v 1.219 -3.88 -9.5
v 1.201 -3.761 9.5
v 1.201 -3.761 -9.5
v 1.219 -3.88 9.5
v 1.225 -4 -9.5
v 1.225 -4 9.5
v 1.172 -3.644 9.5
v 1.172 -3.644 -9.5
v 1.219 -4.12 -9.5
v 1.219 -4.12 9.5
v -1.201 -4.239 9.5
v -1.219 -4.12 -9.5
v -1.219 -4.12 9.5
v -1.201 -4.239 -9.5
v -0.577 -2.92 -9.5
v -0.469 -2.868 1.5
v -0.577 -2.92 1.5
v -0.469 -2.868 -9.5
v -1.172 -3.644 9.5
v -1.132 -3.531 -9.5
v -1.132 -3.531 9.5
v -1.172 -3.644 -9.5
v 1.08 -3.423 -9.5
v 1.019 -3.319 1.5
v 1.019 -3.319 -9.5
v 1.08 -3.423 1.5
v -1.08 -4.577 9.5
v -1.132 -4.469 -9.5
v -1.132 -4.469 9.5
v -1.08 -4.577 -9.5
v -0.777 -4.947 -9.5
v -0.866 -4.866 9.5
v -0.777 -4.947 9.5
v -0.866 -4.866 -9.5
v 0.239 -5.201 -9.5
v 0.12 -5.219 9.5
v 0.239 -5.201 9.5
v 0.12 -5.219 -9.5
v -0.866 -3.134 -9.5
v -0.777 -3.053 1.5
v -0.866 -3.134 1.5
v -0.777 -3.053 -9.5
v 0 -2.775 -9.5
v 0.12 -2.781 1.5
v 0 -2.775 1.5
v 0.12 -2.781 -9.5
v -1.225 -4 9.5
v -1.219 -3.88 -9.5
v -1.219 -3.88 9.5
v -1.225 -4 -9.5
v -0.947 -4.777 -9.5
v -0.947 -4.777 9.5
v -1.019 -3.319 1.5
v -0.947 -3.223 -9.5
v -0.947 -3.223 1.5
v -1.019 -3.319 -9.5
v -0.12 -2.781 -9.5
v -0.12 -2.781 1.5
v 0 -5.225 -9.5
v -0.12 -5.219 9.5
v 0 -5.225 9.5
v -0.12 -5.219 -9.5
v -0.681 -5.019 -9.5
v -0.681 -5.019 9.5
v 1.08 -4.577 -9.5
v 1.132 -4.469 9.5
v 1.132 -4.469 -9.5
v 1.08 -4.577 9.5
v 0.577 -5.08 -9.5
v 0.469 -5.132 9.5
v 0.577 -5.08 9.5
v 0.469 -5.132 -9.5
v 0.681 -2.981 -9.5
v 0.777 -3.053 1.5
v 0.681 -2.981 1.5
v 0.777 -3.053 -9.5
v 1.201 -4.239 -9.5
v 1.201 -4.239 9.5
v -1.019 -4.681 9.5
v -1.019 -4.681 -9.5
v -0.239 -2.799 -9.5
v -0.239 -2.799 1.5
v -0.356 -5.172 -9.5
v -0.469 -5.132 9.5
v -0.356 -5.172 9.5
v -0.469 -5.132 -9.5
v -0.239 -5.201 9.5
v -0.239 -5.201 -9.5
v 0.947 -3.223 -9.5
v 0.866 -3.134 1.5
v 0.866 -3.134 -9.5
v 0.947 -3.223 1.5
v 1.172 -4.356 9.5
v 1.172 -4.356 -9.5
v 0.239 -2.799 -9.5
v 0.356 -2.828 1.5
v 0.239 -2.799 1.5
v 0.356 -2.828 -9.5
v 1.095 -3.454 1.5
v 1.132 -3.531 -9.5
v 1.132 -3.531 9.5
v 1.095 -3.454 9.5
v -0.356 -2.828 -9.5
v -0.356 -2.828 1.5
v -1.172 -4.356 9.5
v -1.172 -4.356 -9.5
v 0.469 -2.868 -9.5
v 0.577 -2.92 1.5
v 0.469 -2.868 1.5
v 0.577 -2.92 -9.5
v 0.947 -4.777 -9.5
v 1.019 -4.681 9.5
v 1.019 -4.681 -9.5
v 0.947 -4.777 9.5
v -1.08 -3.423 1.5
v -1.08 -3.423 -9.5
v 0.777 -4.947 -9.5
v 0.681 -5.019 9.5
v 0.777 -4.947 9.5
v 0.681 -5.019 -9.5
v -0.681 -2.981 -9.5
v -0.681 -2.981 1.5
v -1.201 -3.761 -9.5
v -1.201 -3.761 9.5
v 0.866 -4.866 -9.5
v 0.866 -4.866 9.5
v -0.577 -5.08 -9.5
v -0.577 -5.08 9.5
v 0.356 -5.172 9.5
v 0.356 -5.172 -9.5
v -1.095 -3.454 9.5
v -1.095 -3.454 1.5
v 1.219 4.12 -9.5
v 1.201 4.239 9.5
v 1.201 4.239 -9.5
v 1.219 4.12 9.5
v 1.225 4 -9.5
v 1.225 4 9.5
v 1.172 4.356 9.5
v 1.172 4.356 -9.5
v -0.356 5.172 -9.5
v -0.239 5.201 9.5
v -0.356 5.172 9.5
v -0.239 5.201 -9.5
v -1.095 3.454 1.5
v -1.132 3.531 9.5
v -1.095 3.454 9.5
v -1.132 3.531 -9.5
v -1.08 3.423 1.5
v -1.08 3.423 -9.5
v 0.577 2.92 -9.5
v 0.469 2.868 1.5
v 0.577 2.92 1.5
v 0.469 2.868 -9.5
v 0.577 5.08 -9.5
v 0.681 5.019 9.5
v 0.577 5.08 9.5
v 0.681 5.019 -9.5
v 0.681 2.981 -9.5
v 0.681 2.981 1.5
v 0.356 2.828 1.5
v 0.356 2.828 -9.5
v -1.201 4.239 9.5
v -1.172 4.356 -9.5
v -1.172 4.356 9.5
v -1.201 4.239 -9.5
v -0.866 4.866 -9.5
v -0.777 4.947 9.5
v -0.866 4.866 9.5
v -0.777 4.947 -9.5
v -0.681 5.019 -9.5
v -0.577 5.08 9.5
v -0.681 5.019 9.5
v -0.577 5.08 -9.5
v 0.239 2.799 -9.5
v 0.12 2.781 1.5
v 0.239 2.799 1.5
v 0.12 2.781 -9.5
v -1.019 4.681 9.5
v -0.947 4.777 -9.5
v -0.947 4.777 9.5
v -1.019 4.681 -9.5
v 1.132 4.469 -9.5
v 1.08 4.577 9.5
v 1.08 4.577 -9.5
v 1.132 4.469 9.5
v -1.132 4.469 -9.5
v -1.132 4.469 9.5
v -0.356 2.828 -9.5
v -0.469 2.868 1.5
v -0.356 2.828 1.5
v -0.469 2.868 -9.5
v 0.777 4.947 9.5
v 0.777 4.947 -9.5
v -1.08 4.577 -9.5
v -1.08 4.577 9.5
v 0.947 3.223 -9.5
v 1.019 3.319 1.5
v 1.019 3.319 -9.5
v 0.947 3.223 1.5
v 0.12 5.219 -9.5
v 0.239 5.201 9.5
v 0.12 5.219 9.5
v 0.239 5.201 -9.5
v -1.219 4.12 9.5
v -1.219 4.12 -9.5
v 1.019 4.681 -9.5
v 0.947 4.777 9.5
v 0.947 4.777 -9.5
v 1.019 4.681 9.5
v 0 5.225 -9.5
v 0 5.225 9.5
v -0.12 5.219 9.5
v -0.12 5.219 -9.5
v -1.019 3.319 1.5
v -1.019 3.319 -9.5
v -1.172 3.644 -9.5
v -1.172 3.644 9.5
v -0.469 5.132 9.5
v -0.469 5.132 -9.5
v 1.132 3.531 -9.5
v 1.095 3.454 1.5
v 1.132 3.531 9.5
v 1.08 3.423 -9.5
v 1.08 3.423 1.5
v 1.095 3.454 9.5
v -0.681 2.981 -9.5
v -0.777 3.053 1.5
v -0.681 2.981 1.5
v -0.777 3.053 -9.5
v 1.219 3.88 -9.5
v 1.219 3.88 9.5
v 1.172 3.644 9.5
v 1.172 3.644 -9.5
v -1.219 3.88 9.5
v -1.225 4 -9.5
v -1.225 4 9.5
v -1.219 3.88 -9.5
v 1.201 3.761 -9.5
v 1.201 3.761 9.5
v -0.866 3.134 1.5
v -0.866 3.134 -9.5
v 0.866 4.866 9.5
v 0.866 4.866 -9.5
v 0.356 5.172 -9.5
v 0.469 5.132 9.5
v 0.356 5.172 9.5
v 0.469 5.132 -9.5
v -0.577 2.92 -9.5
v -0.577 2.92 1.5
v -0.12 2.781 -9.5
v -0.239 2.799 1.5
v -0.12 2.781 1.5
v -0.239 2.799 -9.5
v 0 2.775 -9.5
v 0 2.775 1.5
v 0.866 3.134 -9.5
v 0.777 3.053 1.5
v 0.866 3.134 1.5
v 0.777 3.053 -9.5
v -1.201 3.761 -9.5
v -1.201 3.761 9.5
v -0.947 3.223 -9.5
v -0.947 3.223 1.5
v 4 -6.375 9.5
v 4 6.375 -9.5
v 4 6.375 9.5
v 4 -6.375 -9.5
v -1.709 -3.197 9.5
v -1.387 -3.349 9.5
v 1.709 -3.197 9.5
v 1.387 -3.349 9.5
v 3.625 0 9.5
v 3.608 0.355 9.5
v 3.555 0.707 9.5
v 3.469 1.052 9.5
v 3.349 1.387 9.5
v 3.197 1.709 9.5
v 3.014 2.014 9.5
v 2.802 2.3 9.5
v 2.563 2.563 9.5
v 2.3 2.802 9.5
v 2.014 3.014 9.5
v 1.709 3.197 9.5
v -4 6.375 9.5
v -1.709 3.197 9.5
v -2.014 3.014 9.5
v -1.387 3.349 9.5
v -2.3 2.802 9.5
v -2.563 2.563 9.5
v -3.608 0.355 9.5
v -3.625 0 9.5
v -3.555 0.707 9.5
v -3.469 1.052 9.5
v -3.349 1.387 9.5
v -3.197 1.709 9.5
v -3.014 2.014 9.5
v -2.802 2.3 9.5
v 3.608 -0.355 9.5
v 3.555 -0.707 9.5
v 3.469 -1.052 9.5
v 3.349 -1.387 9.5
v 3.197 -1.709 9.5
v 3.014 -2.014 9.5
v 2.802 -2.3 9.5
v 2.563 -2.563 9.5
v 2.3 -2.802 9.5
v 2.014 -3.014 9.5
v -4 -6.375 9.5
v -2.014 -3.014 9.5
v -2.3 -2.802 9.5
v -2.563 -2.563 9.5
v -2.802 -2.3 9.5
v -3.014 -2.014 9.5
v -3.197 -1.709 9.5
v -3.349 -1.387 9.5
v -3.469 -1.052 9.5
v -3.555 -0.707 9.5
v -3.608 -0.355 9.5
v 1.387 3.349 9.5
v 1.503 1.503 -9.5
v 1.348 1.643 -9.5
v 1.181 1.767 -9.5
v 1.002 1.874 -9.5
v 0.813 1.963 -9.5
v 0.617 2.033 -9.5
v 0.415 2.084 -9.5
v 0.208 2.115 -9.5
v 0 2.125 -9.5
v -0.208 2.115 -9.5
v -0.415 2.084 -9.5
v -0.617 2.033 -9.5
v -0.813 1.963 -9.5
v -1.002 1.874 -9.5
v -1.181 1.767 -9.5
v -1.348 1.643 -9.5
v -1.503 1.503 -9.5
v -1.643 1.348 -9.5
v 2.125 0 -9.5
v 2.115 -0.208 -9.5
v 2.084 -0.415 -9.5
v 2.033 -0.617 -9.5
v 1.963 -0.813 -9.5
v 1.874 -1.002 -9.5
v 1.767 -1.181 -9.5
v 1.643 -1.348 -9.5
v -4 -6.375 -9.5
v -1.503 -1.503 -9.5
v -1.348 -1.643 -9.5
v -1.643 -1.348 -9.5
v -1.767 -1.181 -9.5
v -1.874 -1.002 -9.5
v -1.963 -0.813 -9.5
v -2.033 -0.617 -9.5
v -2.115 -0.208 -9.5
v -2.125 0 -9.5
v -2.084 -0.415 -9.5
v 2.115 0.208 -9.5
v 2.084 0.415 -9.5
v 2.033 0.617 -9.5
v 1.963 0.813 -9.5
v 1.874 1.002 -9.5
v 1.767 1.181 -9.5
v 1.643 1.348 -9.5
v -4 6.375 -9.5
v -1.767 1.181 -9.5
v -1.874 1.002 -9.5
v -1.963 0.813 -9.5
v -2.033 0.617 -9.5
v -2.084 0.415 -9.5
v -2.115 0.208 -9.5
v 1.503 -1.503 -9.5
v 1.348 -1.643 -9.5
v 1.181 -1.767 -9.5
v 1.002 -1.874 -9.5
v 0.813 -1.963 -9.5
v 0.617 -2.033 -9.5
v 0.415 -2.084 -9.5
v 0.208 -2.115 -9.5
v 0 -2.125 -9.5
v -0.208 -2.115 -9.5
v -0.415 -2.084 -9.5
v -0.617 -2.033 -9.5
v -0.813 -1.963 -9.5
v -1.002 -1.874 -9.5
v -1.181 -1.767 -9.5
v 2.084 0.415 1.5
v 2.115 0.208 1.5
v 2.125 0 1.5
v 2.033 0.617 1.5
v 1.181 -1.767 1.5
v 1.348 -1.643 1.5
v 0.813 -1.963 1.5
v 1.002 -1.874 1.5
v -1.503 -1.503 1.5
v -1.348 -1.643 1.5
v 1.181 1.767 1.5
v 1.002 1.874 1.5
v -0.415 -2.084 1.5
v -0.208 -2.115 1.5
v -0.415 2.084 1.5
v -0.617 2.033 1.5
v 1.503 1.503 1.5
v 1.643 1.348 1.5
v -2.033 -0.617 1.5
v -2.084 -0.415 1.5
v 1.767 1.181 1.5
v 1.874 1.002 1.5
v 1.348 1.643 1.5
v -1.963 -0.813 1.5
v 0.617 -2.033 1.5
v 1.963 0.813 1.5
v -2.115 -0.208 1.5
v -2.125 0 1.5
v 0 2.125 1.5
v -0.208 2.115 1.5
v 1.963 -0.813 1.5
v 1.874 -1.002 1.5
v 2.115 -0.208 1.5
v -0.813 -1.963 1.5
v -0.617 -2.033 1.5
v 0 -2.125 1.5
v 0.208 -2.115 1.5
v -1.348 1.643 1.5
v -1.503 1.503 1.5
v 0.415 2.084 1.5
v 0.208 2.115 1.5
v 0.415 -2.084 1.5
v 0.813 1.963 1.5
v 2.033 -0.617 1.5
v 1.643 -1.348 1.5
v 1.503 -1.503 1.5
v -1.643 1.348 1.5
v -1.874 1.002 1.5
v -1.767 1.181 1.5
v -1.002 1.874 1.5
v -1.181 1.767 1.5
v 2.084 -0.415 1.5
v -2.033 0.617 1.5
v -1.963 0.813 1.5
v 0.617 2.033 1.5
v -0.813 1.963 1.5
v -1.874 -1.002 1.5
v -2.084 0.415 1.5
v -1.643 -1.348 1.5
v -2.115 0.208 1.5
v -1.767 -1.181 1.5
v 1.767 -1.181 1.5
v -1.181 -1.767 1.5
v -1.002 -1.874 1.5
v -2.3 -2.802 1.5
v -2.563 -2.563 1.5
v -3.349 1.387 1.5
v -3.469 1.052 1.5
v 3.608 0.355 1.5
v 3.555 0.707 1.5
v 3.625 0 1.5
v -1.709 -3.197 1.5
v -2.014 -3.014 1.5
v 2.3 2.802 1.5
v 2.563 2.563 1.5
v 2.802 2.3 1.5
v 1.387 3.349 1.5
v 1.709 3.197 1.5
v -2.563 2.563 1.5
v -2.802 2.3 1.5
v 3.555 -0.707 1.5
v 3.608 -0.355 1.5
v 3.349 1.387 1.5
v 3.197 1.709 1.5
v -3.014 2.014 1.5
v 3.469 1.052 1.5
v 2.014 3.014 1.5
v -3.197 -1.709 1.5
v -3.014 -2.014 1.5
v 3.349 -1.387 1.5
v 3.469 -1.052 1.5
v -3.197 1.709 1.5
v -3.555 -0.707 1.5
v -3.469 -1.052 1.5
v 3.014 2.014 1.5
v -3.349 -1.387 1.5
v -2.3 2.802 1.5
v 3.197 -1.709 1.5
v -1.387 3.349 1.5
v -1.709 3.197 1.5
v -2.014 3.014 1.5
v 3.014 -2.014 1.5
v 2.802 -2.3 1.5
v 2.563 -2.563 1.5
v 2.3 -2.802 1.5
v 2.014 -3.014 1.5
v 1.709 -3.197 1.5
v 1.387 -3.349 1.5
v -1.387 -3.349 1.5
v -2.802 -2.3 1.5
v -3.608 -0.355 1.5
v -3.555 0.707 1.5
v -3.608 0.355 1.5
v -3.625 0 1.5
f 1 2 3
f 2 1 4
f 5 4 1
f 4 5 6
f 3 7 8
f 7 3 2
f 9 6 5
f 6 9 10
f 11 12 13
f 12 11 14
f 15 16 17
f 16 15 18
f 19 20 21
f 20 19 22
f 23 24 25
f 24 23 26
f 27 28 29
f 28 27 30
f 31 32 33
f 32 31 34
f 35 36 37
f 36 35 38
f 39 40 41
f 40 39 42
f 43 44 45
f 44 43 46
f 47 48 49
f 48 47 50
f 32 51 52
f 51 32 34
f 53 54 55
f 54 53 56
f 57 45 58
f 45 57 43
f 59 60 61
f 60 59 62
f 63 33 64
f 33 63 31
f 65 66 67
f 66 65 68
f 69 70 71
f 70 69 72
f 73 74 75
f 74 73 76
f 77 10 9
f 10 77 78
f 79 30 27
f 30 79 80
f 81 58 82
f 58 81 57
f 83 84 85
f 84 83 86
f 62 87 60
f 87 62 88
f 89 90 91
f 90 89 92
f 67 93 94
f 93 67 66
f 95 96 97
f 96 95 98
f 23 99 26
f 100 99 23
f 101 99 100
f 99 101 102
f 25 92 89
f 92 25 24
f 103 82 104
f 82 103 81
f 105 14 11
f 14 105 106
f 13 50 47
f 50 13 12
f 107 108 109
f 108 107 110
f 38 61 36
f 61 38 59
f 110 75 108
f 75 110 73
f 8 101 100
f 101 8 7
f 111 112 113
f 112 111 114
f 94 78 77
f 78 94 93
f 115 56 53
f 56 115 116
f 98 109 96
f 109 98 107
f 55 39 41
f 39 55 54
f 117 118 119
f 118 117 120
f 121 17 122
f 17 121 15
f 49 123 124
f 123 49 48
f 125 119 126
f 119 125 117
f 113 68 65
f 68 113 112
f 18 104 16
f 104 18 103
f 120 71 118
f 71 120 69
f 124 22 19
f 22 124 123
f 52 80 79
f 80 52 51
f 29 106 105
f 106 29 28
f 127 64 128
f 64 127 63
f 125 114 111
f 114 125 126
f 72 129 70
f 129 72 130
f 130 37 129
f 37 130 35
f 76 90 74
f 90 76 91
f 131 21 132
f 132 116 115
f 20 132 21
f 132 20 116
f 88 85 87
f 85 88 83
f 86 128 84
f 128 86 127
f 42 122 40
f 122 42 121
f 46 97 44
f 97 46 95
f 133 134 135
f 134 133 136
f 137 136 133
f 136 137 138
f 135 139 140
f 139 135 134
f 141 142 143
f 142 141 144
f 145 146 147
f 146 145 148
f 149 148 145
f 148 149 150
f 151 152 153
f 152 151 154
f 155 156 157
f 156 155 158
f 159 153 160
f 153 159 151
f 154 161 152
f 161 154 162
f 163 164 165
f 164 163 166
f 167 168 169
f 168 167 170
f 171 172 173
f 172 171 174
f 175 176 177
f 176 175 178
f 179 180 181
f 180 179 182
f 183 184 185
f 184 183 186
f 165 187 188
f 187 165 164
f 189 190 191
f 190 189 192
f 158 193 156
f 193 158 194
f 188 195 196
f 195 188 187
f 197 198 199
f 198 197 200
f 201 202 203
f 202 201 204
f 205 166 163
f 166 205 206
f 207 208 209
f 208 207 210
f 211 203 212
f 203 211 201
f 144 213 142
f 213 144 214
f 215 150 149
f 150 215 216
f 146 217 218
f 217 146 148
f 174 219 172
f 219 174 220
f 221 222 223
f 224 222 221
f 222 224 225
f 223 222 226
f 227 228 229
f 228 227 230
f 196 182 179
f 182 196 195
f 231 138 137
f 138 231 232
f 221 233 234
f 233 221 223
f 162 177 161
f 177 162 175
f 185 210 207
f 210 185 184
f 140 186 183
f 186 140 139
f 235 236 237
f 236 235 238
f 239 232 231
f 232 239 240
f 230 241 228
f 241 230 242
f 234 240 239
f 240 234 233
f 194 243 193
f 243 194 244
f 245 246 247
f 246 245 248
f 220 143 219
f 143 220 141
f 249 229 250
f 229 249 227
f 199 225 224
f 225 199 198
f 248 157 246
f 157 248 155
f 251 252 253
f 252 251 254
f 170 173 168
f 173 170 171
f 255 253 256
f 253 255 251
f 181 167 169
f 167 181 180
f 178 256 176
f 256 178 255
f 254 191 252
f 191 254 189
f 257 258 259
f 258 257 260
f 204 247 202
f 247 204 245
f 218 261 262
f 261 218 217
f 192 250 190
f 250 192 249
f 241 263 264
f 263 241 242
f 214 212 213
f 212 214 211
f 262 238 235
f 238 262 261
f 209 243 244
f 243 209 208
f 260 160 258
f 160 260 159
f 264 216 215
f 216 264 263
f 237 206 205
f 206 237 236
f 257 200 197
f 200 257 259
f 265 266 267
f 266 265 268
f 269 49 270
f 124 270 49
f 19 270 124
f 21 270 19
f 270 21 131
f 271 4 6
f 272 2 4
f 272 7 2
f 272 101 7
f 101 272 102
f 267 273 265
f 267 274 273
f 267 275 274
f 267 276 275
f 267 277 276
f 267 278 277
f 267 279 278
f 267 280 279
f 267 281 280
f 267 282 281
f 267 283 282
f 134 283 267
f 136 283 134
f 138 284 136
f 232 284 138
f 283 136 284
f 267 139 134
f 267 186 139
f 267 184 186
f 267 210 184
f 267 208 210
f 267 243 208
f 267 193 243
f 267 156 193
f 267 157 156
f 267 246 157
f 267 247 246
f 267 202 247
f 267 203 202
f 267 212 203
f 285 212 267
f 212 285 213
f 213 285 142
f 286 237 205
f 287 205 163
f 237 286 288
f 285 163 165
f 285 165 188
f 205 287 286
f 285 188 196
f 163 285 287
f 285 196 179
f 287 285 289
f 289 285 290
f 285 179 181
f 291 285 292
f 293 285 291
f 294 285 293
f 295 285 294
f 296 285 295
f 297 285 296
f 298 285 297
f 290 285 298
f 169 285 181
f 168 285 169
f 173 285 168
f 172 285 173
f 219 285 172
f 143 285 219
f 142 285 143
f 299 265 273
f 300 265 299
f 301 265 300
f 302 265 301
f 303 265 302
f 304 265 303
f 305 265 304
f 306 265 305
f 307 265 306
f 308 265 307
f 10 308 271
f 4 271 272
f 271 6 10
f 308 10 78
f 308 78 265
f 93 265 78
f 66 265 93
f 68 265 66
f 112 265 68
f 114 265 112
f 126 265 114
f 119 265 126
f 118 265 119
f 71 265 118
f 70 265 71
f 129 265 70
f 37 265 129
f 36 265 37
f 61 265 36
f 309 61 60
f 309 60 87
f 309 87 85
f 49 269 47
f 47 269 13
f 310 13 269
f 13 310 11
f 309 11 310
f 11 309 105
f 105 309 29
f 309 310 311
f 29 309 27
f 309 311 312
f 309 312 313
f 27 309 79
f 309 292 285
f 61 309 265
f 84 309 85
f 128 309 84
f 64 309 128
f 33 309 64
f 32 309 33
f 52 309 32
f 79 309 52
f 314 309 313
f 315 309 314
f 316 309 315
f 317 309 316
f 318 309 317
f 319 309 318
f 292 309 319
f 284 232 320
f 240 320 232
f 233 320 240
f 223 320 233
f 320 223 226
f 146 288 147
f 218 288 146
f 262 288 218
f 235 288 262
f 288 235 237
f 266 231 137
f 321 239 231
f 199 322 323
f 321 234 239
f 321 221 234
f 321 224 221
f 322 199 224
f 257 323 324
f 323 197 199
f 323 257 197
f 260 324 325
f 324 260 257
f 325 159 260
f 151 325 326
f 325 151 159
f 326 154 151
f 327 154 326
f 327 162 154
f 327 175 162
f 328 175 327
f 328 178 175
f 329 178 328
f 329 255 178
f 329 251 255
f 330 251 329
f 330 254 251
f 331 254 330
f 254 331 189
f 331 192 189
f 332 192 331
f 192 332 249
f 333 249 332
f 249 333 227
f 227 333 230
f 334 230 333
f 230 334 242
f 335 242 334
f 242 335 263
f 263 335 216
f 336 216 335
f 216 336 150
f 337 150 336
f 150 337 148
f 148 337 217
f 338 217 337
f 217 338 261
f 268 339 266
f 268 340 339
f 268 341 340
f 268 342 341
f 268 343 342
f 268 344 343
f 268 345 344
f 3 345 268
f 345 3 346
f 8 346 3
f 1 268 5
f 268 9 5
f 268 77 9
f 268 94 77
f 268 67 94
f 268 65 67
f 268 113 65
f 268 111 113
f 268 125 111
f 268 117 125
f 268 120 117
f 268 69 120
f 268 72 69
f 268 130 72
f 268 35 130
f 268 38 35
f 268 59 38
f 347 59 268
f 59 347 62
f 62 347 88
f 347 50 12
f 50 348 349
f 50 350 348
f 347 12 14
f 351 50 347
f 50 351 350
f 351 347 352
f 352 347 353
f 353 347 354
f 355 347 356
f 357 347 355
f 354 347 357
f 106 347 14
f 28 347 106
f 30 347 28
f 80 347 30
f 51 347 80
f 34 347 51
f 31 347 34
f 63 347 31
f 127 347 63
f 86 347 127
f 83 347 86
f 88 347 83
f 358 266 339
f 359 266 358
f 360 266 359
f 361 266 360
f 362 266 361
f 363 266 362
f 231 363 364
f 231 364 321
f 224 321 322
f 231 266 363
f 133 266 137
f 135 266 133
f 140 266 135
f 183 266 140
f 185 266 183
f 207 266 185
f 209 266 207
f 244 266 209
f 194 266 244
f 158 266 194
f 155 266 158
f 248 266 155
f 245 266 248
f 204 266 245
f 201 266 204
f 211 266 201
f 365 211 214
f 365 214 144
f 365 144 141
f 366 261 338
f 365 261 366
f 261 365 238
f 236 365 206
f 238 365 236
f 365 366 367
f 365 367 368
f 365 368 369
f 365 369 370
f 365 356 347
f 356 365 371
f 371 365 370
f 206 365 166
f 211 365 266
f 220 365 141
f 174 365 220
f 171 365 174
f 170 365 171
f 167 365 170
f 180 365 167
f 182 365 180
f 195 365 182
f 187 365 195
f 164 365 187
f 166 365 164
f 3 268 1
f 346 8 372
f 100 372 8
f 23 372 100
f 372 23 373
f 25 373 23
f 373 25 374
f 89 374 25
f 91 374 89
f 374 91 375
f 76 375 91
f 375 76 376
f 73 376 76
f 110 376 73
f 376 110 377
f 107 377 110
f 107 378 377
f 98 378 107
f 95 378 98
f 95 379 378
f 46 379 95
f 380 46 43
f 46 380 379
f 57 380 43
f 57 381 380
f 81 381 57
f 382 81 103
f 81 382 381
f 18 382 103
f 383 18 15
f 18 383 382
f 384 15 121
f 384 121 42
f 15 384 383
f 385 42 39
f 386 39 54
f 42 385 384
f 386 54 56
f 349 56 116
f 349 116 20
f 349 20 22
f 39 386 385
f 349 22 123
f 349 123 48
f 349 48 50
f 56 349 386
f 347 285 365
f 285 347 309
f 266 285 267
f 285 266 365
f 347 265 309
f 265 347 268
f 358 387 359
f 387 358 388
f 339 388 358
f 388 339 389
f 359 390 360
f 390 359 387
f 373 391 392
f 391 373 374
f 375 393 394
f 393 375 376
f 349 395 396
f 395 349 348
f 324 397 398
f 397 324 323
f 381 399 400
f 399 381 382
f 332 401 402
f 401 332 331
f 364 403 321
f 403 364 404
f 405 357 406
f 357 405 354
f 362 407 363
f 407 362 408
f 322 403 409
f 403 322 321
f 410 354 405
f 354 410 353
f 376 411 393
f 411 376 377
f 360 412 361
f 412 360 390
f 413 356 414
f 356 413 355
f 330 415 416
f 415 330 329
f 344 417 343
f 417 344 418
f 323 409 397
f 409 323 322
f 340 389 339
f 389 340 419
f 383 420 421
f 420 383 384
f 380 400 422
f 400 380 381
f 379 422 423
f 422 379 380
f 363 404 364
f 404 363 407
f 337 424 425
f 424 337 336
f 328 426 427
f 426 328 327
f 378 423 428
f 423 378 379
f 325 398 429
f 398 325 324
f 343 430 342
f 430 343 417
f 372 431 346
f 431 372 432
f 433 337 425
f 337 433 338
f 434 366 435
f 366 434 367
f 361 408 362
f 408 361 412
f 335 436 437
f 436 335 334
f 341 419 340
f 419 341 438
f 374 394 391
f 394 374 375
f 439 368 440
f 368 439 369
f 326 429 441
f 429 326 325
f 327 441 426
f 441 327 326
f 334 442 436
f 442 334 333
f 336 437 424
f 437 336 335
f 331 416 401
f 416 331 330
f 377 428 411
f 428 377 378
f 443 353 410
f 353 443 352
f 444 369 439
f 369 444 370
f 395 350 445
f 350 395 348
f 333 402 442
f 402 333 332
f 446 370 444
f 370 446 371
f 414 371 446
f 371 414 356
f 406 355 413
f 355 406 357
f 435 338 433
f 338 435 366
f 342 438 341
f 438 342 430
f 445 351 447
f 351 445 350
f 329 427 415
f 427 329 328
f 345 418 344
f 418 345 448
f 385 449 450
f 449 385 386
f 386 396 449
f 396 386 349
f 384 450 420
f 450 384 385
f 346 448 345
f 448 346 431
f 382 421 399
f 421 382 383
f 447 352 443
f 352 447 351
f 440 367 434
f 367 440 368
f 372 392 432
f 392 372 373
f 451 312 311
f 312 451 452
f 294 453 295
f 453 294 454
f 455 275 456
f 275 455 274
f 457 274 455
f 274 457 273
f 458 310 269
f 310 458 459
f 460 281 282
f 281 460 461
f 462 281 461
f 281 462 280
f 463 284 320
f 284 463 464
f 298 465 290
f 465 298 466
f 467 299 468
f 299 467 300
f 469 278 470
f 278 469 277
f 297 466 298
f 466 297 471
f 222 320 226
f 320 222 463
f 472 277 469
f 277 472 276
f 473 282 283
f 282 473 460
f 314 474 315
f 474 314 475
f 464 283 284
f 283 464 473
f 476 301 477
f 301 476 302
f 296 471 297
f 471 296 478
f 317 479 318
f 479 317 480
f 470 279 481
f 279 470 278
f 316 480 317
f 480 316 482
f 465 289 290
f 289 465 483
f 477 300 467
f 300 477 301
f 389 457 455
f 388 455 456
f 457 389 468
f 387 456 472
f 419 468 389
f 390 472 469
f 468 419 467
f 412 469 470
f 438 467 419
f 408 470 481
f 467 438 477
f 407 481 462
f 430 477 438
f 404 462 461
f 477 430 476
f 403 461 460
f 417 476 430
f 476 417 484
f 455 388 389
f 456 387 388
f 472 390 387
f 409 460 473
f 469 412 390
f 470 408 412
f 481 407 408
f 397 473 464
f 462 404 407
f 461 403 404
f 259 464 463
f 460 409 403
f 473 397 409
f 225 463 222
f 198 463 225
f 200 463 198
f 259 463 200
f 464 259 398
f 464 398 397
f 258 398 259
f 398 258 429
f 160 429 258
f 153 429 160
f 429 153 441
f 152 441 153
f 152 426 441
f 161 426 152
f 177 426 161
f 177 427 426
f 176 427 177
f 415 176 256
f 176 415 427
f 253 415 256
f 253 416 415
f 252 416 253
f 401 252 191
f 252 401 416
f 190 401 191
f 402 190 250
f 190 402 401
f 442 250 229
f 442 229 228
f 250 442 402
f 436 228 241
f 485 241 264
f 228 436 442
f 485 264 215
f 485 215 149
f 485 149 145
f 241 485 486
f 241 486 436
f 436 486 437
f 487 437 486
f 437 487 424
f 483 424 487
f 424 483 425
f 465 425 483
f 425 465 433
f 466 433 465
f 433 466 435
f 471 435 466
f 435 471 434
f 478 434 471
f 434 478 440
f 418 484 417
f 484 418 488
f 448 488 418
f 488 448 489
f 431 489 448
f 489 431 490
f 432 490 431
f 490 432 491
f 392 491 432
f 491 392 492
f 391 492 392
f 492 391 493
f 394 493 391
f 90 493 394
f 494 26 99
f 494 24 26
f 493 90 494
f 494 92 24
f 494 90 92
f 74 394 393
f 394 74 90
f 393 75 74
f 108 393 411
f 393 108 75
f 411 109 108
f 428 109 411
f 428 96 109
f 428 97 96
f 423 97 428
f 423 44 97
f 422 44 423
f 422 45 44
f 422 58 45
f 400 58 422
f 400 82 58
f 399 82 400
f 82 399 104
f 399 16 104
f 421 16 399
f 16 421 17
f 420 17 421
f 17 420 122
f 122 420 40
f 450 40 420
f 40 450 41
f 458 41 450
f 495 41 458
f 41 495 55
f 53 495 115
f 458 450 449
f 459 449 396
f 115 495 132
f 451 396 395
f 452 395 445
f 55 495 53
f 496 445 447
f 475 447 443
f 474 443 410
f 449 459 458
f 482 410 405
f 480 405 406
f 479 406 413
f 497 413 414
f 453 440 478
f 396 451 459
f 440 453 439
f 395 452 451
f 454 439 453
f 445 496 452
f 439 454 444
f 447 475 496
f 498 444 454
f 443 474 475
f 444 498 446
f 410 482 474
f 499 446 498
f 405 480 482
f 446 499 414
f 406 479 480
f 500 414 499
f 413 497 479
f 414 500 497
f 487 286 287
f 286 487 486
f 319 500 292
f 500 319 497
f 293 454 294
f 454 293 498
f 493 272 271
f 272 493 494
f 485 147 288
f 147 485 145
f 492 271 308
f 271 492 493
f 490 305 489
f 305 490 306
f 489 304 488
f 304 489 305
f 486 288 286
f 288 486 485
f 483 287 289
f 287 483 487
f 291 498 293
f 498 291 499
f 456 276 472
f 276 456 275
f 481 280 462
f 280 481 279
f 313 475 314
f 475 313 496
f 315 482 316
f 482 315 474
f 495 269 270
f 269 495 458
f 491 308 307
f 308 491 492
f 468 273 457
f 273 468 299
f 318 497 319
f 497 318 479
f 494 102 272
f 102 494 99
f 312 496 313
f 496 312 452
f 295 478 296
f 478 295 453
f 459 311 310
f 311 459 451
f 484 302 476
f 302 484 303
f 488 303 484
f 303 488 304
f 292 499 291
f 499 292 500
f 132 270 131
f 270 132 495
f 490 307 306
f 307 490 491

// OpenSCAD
$fn = 64;

// Leadscrew nut housing block (X width, Y length, Z height)
block_W = 8.0;     // X
block_L = 12.75;   // Y
block_H = 19.0;    // Z

// Simple, recognizable "leadscrew nut housing" features
clearance = 0.25;          // small clearance for fit
overlap   = 1.0;           // overlap for robust boolean ops

// Through bore for leadscrew (runs along Z)
screw_d = 4.0 + clearance; // generic leadscrew clearance

// Pocket to hold a cylindrical nut insert (counterbore from top)
nut_od  = 7.0 + clearance; // must fit within 8mm width
nut_h   = 8.0;             // depth of nut pocket from top

// Two mounting holes (through Z), spaced along Y
mount_d = 2.2 + clearance;
mount_y_spacing = 8.0;     // keep within 12.75mm length

module model() {
    // Single connected solid: one block with subtracted bores/pockets
    difference() {
        // Main rectangular housing block (matches 8.0 x 12.75 x 19.0)
        cube([block_W, block_L, block_H], center=true);

        // Central leadscrew through-hole (Z axis)
        cylinder(d=screw_d, h=block_H + 2*overlap, center=true);

        // Nut pocket (counterbore) from the top face down
        // Top face at +block_H/2; pocket extends downward by nut_h
        translate([0, 0, (block_H/2) - (nut_h/2) + (overlap/2)])
            cylinder(d=nut_od, h=nut_h + overlap, center=true);

        // Mounting holes (through Z), symmetric along Y
        for (y = [-mount_y_spacing/2, mount_y_spacing/2]) {
            translate([0, y, 0])
                cylinder(d=mount_d, h=block_H + 2*overlap, center=true);
        }
    }
}

model();
